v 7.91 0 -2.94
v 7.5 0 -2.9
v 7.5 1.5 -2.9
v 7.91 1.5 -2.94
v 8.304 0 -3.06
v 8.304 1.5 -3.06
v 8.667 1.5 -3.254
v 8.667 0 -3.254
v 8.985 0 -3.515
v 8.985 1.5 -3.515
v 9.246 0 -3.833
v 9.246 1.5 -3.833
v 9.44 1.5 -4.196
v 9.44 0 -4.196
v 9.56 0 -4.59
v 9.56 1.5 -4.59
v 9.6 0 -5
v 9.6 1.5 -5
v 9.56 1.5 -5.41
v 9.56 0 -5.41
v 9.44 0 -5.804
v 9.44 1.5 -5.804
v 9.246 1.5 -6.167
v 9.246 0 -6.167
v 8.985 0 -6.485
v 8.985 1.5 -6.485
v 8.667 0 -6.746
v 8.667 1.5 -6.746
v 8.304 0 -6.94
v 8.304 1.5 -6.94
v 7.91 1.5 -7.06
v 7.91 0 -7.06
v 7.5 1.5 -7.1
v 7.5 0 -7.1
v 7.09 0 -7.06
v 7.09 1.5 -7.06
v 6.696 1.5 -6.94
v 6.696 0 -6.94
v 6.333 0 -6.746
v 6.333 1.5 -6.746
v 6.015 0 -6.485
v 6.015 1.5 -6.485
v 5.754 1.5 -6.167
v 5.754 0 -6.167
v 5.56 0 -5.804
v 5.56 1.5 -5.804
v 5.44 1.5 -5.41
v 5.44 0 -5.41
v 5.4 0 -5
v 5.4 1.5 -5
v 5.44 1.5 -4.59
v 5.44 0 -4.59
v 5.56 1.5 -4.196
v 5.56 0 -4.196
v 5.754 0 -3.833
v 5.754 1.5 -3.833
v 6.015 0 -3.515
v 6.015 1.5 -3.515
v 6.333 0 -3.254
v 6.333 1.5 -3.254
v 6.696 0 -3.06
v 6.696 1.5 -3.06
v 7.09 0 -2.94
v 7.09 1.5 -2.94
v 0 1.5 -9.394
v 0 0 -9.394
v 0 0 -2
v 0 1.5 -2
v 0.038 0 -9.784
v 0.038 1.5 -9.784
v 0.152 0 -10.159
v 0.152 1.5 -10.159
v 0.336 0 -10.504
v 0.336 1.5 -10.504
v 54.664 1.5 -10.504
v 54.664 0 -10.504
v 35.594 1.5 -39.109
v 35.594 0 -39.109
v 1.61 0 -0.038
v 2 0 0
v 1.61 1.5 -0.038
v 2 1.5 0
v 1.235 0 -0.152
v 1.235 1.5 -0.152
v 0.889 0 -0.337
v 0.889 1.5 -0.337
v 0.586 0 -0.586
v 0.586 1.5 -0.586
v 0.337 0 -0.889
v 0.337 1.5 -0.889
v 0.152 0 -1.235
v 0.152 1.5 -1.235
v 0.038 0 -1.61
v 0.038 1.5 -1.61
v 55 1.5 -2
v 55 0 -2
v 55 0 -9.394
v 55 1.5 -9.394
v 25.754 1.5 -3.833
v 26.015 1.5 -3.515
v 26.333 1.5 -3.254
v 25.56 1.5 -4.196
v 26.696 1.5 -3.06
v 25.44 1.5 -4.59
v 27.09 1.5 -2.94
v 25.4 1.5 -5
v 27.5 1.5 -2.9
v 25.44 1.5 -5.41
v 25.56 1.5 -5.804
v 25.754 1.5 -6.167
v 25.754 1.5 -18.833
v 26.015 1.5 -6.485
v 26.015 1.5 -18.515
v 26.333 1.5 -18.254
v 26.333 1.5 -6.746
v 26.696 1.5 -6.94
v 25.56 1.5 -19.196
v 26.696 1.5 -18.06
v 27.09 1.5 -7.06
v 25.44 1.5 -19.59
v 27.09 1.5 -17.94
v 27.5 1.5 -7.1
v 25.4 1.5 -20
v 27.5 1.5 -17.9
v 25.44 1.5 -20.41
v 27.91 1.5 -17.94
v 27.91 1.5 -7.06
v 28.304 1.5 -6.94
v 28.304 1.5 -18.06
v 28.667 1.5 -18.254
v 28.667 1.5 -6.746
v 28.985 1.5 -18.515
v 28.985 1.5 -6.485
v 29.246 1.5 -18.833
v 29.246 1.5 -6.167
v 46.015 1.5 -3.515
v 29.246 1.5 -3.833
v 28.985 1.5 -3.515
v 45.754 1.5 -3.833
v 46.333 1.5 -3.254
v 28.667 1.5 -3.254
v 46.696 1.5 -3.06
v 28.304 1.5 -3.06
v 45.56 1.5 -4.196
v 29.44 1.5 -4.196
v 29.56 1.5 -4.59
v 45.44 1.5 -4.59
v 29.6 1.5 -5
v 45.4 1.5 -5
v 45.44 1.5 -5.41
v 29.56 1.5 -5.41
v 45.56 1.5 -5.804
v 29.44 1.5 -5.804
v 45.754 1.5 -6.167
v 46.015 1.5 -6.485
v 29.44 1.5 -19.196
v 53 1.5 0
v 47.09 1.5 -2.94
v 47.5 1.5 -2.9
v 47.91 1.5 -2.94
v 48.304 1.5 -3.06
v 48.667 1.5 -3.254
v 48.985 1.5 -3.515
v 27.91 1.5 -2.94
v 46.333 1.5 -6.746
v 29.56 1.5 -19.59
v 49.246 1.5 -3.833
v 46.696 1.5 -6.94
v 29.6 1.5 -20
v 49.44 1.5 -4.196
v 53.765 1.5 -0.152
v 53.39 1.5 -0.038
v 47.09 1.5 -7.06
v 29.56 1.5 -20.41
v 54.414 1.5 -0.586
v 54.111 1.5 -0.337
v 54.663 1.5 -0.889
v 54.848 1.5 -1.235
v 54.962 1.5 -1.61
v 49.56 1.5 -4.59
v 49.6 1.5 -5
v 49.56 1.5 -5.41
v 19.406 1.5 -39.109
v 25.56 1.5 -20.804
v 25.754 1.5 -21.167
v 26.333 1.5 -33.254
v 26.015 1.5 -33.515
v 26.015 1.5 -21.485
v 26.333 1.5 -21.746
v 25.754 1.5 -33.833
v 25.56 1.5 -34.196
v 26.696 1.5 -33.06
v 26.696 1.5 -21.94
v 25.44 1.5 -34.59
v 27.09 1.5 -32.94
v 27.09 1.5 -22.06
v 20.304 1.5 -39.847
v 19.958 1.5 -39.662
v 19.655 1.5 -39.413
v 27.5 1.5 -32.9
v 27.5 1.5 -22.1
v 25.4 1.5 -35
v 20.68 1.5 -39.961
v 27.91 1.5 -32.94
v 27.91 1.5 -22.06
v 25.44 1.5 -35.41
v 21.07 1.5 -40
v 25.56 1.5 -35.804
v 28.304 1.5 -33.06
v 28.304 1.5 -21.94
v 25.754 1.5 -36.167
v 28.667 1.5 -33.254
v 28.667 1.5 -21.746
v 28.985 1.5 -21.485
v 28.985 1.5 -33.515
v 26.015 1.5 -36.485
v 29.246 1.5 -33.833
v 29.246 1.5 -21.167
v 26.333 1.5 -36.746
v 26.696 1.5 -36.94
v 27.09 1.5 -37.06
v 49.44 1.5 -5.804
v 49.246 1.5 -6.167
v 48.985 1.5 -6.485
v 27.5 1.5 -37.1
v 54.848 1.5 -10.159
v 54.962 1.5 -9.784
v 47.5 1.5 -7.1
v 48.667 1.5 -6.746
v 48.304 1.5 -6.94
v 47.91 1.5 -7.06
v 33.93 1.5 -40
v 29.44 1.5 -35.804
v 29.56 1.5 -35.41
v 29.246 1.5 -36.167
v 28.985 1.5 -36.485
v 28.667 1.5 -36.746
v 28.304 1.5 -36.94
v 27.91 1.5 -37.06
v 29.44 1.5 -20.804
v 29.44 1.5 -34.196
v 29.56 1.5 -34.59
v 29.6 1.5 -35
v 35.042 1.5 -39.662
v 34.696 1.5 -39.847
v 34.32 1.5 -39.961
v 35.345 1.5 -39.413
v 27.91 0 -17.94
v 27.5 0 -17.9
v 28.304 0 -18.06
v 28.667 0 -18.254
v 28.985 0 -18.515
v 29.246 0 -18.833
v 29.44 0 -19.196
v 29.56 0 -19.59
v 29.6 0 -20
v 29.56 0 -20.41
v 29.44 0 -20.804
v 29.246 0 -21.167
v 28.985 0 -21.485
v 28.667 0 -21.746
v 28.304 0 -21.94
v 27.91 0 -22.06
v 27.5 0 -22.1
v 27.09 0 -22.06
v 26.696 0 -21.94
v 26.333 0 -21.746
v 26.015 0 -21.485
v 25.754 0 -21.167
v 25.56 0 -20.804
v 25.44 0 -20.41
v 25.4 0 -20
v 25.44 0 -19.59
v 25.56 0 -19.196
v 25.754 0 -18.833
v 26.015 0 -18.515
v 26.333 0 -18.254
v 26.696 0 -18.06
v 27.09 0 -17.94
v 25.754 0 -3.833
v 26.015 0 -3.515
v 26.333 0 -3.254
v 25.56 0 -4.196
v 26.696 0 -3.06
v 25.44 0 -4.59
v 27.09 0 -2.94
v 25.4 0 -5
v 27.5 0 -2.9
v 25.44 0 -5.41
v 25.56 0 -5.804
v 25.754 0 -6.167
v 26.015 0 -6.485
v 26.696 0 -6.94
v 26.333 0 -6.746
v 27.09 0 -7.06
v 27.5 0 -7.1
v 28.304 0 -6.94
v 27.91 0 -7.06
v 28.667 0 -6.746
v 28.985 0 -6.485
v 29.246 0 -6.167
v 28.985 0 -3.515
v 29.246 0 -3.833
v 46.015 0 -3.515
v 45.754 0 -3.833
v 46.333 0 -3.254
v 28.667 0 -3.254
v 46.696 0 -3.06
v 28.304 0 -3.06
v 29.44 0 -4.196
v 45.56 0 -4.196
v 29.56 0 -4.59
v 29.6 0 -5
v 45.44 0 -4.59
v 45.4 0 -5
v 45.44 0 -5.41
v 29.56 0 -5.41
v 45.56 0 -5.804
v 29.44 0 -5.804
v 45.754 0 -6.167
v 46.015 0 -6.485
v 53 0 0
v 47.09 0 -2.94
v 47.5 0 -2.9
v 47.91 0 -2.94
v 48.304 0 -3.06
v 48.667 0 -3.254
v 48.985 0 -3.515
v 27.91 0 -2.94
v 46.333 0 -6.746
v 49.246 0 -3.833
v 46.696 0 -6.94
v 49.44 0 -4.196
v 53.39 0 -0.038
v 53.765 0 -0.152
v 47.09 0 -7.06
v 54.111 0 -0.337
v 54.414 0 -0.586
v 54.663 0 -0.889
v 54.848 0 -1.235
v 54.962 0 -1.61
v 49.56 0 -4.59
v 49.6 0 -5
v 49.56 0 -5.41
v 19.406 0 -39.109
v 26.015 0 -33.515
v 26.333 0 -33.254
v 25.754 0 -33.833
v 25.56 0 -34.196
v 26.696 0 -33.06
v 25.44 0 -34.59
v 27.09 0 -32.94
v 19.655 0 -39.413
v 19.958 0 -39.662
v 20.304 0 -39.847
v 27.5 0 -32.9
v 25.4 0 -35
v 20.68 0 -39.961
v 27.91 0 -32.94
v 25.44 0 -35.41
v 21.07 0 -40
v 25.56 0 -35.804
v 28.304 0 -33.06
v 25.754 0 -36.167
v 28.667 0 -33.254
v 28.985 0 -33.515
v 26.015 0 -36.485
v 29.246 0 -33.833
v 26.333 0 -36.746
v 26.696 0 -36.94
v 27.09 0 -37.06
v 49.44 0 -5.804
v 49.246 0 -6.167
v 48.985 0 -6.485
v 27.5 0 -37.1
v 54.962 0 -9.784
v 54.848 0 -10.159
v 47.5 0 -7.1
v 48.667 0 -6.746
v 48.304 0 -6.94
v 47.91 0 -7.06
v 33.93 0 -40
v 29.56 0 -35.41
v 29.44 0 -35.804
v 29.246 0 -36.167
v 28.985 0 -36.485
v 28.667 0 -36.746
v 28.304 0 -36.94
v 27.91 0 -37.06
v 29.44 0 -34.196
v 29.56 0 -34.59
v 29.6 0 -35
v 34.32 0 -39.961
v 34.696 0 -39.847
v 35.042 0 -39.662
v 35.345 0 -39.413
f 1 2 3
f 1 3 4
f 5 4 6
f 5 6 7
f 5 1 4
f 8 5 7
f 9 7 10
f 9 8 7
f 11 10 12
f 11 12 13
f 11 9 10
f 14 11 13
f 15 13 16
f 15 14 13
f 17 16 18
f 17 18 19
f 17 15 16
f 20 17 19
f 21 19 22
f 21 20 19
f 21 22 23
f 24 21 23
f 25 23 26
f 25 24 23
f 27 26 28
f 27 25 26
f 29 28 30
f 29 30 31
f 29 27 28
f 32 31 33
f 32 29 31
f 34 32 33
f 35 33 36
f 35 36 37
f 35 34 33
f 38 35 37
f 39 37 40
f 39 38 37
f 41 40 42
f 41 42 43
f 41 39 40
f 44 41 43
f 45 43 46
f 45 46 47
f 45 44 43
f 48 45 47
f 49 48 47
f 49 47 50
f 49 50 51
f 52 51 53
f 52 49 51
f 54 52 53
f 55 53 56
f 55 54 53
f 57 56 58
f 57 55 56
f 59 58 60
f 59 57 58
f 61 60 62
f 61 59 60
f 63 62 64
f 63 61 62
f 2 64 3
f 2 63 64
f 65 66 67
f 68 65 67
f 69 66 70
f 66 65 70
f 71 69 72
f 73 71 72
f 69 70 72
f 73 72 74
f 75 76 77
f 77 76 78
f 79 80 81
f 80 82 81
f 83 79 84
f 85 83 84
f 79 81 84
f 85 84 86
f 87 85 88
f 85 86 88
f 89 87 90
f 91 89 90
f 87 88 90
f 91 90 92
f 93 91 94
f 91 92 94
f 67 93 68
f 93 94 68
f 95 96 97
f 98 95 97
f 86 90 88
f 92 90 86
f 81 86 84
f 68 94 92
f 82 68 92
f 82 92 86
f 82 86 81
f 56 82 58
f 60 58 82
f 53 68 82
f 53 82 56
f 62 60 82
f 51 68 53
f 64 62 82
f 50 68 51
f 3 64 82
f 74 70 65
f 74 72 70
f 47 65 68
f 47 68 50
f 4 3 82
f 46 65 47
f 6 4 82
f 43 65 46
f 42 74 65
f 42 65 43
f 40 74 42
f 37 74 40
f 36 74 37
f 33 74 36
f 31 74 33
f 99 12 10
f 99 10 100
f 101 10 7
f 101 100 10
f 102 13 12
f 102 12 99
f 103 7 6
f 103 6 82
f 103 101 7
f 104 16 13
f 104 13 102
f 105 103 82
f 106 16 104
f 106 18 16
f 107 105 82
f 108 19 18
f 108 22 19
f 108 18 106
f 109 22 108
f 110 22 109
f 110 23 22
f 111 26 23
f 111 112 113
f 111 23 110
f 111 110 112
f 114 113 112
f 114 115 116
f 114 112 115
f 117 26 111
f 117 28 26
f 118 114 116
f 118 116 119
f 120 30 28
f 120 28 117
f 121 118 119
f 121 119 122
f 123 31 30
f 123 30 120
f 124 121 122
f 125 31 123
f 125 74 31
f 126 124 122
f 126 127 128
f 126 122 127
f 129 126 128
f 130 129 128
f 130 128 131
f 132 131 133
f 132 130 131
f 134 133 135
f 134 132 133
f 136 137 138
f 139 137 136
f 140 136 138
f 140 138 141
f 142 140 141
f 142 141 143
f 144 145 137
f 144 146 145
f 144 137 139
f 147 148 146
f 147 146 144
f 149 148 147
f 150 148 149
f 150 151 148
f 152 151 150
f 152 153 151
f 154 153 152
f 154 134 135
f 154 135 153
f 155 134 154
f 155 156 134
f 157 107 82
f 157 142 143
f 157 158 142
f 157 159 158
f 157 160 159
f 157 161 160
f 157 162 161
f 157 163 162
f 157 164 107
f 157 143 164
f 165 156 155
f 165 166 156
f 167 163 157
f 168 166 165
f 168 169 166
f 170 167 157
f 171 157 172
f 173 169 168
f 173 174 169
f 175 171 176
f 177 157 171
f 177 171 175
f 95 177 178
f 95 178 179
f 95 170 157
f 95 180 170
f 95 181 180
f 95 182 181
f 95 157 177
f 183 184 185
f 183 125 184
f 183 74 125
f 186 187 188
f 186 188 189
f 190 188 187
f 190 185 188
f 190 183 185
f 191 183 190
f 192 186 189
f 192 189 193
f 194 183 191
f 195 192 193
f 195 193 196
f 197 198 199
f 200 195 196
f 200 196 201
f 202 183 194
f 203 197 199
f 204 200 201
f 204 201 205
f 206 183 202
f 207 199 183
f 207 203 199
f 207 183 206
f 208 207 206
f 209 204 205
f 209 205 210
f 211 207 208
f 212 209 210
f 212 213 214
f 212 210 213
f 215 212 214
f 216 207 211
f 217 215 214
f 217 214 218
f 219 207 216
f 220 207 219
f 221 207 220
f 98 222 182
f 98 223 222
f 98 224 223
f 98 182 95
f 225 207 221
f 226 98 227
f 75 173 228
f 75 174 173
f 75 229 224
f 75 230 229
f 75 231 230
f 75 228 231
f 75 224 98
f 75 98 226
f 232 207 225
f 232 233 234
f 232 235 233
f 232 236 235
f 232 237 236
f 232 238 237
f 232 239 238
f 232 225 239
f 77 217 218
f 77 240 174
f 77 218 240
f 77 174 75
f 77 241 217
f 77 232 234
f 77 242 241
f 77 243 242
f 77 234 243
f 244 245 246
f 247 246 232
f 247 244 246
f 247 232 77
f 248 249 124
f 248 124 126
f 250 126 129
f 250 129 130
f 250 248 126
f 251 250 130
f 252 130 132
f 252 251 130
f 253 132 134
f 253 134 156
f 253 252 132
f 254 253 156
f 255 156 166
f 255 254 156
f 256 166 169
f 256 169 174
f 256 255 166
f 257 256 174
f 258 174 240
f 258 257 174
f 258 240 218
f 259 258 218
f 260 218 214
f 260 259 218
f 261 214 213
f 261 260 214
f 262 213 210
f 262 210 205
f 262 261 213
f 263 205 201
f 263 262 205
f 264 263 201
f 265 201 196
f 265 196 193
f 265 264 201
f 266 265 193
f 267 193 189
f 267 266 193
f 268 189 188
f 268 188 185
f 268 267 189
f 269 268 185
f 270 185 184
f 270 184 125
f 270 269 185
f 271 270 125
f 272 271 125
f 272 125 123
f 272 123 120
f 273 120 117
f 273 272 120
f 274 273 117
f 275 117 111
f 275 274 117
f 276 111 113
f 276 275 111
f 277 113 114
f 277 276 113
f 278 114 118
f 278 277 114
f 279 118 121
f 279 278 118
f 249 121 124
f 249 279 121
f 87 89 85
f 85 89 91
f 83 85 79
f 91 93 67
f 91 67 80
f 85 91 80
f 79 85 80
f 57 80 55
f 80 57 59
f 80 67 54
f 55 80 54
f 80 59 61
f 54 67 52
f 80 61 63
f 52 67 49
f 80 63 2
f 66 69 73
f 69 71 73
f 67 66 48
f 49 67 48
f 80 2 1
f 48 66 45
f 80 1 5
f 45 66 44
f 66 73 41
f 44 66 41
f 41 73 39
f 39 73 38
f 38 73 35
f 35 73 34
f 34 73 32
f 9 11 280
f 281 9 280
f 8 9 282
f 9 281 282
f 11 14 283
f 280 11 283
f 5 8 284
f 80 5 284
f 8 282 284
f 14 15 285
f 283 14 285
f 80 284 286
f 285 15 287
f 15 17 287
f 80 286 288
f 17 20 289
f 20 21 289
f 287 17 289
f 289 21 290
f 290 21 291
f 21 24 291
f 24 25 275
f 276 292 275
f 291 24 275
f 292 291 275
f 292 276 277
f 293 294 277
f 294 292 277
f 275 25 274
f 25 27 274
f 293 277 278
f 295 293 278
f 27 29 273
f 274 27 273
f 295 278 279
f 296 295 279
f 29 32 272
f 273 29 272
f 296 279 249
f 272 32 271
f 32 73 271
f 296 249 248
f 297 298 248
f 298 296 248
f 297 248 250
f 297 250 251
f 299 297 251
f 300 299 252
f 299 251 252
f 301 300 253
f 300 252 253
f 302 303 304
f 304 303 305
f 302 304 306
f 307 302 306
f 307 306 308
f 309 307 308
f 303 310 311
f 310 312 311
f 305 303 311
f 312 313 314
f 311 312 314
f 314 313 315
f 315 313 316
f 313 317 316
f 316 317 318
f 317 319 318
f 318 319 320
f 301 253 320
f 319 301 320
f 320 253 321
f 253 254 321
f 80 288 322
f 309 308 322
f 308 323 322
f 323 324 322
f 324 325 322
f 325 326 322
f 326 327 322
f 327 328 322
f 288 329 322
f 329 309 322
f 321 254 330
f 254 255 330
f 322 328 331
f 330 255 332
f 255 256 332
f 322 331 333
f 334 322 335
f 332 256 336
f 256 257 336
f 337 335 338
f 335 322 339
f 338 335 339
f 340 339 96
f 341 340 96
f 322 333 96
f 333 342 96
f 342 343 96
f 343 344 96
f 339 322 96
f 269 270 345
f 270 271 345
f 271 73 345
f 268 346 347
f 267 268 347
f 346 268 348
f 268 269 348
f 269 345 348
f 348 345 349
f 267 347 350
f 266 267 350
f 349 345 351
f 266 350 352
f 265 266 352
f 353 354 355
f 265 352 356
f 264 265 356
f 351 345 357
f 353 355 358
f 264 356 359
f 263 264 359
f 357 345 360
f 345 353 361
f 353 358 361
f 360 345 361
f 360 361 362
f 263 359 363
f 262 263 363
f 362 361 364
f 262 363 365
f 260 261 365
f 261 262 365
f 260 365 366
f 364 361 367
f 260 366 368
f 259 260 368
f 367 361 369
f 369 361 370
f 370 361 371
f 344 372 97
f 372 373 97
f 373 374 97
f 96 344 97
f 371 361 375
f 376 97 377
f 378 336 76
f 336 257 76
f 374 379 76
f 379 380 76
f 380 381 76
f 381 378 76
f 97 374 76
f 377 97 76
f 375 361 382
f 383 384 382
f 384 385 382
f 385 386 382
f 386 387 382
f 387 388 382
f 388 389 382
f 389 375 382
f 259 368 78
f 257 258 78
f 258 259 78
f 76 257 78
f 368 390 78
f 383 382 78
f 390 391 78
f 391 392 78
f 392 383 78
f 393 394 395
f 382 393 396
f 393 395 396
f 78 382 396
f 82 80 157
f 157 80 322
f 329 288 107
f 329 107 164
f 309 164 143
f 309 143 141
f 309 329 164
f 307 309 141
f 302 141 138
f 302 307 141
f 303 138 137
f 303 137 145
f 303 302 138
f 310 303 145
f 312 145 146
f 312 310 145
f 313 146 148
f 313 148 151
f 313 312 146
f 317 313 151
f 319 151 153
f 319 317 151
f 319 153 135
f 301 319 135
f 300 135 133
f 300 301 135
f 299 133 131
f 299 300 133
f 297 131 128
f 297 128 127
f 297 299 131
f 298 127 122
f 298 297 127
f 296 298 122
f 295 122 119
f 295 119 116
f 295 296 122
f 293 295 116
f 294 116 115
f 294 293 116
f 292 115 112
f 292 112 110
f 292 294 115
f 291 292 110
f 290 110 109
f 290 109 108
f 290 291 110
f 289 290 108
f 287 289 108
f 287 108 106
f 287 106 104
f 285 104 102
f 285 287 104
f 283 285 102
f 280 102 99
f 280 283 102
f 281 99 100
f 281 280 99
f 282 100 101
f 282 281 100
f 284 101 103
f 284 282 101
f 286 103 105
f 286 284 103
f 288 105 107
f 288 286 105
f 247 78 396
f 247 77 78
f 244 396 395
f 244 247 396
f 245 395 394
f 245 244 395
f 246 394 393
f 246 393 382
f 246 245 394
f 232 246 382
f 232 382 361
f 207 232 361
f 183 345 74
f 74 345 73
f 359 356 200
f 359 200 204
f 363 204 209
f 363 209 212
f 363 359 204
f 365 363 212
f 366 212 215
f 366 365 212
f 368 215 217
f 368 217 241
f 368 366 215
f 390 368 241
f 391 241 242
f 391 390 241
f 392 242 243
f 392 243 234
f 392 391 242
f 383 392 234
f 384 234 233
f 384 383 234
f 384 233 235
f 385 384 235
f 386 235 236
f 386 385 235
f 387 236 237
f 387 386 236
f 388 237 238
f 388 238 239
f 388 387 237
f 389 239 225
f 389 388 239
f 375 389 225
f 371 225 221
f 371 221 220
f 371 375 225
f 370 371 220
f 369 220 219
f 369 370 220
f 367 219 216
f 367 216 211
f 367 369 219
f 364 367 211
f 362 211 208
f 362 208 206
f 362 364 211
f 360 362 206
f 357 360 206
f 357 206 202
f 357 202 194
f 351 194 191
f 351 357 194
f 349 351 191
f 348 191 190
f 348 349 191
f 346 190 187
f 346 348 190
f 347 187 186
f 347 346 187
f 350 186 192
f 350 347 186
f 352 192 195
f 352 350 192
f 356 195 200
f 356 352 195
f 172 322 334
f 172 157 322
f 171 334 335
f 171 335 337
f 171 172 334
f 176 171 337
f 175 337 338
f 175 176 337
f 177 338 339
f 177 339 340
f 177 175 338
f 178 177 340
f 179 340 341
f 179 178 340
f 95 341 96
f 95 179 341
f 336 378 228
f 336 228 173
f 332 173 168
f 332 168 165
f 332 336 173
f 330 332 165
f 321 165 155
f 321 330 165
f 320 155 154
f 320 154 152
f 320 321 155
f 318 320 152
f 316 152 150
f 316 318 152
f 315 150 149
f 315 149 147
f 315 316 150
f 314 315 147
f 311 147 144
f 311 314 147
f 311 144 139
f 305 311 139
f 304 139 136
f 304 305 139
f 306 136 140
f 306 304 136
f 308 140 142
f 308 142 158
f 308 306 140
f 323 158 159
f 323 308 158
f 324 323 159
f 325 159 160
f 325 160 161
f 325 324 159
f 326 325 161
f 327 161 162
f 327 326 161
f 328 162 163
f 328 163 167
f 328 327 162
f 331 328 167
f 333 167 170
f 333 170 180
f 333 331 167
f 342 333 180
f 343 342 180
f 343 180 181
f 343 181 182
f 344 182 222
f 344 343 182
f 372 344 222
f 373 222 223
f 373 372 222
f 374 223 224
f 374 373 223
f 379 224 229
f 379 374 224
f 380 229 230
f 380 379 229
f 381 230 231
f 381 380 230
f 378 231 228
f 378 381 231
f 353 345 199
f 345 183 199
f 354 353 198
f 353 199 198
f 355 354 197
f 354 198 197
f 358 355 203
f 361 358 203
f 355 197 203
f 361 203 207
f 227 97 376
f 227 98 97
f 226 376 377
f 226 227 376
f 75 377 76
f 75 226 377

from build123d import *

# Parameters (mm, degrees)
SKETCH_1_R      = 2.1
EXTRUDE_1_DEPTH = 1.5
FILLET_1_R      = 2


with BuildPart() as part:
    # ｽｹｯﾁ1 → ﾎﾞｽ - 押し出し1 (new body)
    with BuildSketch(Plane(origin=(0, 0, 0), x_dir=(1, 0, 0), z_dir=(0, 1, 0))):
        Polygon((0, 0), (55, 0), (55, 10), (35, 40), (20, 40), (0, 10), align=None)
        with Locations(Location((7.5, 5, 0), (0, 0, 270))):
            Circle(SKETCH_1_R, mode=Mode.SUBTRACT)
        with Locations(Location((47.5, 5, 0), (0, 0, 90))):
            Circle(SKETCH_1_R, mode=Mode.SUBTRACT)
        with Locations(Location((27.5, 5, 0), (0, 0, 270))):
            Circle(SKETCH_1_R, mode=Mode.SUBTRACT)
        with Locations(Location((27.5, 35, 0), (0, 0, 270))):
            Circle(SKETCH_1_R, mode=Mode.SUBTRACT)
        with Locations(Location((27.5, 20, 0), (0, 0, 270))):
            Circle(SKETCH_1_R, mode=Mode.SUBTRACT)
    extrude(amount=EXTRUDE_1_DEPTH)

    # ﾌｨﾚｯﾄ1
    fillet_1_edges = [part.edges().sort_by_distance(p)[0] for p in [
        (0, 0.75, -10),
        (20, 0.75, -40),
        (35, 0.75, -40),
        (55, 0.75, -10),
        (55, 0.75, 0),
        (0, 0.75, 0),
    ]]
    fillet(fillet_1_edges, radius=FILLET_1_R)


solid = part.part
